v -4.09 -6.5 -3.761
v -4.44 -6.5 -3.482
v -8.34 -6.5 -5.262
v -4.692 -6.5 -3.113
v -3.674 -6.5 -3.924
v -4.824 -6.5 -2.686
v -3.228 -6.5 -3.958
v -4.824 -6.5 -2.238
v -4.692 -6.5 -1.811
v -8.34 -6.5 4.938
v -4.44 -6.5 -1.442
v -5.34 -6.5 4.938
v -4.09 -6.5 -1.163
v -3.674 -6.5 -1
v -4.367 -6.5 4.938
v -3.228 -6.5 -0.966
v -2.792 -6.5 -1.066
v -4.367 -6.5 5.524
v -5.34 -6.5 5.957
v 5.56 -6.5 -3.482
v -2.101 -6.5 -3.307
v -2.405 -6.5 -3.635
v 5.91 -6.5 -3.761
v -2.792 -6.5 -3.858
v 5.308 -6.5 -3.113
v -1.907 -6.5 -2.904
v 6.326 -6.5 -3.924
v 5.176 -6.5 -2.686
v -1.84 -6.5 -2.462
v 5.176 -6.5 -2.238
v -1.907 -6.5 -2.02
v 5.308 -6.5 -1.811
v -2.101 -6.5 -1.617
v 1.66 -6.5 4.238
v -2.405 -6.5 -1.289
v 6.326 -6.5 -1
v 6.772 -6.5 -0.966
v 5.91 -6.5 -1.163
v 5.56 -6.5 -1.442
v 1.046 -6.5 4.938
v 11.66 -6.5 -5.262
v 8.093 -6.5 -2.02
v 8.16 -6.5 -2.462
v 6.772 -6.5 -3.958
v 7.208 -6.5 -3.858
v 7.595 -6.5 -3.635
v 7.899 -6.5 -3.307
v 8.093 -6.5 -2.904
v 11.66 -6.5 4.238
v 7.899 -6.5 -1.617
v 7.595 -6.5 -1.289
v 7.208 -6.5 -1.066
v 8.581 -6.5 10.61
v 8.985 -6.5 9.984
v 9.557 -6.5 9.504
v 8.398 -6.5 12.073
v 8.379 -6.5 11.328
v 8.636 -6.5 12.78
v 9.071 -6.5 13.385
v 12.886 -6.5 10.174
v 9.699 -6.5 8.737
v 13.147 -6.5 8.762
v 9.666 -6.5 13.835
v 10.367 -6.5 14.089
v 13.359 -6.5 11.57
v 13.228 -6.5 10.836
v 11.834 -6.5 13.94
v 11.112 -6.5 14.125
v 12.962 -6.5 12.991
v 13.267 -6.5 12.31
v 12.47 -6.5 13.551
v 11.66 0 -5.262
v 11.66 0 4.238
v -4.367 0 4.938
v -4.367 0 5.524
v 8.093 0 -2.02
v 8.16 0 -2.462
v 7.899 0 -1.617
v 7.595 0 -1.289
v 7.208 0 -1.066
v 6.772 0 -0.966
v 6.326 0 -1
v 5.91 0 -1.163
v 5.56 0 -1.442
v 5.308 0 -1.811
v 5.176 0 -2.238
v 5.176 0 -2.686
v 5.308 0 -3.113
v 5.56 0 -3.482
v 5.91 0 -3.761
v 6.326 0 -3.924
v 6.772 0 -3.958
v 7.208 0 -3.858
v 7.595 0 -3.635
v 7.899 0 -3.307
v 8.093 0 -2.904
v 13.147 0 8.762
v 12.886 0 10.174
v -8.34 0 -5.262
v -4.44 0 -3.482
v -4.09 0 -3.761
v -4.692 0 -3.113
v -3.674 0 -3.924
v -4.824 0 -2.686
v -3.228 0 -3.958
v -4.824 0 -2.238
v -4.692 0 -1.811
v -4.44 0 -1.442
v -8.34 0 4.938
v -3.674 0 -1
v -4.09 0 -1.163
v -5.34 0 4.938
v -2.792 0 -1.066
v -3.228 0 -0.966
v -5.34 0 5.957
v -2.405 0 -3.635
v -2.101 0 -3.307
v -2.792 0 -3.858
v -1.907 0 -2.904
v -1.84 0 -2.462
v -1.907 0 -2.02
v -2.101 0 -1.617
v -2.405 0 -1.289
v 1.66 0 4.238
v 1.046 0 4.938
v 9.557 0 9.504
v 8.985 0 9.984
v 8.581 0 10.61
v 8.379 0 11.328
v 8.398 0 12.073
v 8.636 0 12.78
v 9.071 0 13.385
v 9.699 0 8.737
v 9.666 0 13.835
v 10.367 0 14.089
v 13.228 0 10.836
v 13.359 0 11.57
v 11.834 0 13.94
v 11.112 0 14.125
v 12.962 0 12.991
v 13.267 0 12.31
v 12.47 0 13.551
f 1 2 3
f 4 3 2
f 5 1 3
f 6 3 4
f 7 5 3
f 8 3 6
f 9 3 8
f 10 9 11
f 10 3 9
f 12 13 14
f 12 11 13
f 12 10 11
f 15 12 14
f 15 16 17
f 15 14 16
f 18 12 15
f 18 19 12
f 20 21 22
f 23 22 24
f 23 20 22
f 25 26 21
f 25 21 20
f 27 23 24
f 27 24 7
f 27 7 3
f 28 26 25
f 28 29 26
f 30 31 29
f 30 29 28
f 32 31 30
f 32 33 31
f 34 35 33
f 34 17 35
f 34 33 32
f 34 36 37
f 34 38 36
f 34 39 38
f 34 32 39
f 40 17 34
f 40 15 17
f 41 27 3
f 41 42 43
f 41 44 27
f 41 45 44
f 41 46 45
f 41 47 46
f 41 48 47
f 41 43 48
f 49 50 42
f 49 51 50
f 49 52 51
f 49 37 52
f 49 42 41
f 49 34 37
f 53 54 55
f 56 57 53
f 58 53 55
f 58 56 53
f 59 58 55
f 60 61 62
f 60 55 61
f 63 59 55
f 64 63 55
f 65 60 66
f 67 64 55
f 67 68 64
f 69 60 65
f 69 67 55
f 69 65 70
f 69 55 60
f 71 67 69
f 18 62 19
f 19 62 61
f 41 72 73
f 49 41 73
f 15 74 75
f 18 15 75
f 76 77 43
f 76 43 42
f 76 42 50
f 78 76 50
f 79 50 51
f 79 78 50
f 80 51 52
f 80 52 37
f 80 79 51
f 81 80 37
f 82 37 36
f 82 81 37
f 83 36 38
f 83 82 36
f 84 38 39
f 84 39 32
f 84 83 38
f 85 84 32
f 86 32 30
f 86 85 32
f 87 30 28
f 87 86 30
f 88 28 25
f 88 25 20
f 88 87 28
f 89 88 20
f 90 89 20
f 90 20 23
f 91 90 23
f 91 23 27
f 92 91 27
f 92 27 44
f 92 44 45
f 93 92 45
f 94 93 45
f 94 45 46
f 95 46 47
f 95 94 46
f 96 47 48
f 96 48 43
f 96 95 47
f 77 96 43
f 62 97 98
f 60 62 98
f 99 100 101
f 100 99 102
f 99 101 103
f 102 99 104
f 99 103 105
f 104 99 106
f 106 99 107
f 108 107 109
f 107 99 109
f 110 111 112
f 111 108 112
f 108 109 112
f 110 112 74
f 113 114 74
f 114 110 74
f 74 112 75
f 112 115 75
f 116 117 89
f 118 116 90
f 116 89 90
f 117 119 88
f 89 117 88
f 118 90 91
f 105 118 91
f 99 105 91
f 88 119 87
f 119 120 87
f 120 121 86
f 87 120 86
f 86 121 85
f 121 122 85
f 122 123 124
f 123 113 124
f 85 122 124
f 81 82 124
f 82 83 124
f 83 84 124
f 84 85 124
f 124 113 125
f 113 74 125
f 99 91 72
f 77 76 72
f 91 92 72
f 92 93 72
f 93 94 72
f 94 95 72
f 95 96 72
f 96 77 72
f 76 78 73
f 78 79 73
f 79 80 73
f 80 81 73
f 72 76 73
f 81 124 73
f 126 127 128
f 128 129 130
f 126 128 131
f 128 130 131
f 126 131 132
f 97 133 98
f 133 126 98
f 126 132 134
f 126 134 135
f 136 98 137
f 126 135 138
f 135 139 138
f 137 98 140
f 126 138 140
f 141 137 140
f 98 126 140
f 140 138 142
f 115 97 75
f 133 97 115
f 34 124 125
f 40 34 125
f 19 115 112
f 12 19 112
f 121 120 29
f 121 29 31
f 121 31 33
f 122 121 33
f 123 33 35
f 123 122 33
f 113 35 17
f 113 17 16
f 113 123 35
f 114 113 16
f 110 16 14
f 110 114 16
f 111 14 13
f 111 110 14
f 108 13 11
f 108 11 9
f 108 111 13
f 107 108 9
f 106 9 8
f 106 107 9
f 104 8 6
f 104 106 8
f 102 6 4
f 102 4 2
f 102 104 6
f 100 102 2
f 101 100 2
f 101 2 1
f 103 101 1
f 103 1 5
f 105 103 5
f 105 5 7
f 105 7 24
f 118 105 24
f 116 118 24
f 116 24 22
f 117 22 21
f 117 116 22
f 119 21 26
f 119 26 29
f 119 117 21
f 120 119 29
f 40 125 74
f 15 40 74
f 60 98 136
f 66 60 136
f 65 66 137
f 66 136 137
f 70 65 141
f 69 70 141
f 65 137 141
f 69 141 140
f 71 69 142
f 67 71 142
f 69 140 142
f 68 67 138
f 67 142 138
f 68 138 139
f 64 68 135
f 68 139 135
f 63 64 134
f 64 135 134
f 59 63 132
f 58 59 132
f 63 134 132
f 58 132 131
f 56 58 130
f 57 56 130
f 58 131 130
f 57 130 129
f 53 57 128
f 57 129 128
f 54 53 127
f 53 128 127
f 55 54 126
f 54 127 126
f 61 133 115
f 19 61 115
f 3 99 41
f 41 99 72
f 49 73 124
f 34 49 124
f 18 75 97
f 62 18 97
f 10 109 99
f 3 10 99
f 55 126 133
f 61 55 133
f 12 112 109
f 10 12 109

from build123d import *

# Parameters (mm, degrees)
F0_R     = 1.5
F1_DEPTH = 6.5


with BuildPart() as f1:
    # F0 (on Front) → F1 (new body)
    with BuildSketch(Plane.XZ):
        Polygon((-8.340434, 4.938039), (-8.340434, -5.261961), (11.659566, -5.261961), (11.659566, 4.238039), (1.659566, 4.238039), (1.045704, 4.938039), (-4.366579, 4.938039), (-5.340434, 4.938039), align=None)
        with Locations((-3.340434, -2.461961)):
            Circle(F0_R, mode=Mode.SUBTRACT)
        with Locations((6.659566, -2.461961)):
            Circle(F0_R, mode=Mode.SUBTRACT)
        with BuildLine():
            Line((-5.340434, 5.956738), (-5.340434, 4.938039))
            Line((-5.340434, 4.938039), (-4.366579, 4.938039))
            Line((-4.366579, 4.938039), (-4.366579, 5.524251))
            Line((-4.366579, 5.524251), (13.146718, 8.761675))
            Line((13.146718, 8.761675), (12.885723, 10.173564))
            ThreePointArc((12.885723, 10.173564), (10.366926, 14.08902), (9.556615, 9.504423))
            Line((9.556615, 9.504423), (9.69852, 8.736767))
            Line((9.69852, 8.736767), (-5.340434, 5.956738))
        make_face()
    extrude(amount=F1_DEPTH)


solid = f1.part
